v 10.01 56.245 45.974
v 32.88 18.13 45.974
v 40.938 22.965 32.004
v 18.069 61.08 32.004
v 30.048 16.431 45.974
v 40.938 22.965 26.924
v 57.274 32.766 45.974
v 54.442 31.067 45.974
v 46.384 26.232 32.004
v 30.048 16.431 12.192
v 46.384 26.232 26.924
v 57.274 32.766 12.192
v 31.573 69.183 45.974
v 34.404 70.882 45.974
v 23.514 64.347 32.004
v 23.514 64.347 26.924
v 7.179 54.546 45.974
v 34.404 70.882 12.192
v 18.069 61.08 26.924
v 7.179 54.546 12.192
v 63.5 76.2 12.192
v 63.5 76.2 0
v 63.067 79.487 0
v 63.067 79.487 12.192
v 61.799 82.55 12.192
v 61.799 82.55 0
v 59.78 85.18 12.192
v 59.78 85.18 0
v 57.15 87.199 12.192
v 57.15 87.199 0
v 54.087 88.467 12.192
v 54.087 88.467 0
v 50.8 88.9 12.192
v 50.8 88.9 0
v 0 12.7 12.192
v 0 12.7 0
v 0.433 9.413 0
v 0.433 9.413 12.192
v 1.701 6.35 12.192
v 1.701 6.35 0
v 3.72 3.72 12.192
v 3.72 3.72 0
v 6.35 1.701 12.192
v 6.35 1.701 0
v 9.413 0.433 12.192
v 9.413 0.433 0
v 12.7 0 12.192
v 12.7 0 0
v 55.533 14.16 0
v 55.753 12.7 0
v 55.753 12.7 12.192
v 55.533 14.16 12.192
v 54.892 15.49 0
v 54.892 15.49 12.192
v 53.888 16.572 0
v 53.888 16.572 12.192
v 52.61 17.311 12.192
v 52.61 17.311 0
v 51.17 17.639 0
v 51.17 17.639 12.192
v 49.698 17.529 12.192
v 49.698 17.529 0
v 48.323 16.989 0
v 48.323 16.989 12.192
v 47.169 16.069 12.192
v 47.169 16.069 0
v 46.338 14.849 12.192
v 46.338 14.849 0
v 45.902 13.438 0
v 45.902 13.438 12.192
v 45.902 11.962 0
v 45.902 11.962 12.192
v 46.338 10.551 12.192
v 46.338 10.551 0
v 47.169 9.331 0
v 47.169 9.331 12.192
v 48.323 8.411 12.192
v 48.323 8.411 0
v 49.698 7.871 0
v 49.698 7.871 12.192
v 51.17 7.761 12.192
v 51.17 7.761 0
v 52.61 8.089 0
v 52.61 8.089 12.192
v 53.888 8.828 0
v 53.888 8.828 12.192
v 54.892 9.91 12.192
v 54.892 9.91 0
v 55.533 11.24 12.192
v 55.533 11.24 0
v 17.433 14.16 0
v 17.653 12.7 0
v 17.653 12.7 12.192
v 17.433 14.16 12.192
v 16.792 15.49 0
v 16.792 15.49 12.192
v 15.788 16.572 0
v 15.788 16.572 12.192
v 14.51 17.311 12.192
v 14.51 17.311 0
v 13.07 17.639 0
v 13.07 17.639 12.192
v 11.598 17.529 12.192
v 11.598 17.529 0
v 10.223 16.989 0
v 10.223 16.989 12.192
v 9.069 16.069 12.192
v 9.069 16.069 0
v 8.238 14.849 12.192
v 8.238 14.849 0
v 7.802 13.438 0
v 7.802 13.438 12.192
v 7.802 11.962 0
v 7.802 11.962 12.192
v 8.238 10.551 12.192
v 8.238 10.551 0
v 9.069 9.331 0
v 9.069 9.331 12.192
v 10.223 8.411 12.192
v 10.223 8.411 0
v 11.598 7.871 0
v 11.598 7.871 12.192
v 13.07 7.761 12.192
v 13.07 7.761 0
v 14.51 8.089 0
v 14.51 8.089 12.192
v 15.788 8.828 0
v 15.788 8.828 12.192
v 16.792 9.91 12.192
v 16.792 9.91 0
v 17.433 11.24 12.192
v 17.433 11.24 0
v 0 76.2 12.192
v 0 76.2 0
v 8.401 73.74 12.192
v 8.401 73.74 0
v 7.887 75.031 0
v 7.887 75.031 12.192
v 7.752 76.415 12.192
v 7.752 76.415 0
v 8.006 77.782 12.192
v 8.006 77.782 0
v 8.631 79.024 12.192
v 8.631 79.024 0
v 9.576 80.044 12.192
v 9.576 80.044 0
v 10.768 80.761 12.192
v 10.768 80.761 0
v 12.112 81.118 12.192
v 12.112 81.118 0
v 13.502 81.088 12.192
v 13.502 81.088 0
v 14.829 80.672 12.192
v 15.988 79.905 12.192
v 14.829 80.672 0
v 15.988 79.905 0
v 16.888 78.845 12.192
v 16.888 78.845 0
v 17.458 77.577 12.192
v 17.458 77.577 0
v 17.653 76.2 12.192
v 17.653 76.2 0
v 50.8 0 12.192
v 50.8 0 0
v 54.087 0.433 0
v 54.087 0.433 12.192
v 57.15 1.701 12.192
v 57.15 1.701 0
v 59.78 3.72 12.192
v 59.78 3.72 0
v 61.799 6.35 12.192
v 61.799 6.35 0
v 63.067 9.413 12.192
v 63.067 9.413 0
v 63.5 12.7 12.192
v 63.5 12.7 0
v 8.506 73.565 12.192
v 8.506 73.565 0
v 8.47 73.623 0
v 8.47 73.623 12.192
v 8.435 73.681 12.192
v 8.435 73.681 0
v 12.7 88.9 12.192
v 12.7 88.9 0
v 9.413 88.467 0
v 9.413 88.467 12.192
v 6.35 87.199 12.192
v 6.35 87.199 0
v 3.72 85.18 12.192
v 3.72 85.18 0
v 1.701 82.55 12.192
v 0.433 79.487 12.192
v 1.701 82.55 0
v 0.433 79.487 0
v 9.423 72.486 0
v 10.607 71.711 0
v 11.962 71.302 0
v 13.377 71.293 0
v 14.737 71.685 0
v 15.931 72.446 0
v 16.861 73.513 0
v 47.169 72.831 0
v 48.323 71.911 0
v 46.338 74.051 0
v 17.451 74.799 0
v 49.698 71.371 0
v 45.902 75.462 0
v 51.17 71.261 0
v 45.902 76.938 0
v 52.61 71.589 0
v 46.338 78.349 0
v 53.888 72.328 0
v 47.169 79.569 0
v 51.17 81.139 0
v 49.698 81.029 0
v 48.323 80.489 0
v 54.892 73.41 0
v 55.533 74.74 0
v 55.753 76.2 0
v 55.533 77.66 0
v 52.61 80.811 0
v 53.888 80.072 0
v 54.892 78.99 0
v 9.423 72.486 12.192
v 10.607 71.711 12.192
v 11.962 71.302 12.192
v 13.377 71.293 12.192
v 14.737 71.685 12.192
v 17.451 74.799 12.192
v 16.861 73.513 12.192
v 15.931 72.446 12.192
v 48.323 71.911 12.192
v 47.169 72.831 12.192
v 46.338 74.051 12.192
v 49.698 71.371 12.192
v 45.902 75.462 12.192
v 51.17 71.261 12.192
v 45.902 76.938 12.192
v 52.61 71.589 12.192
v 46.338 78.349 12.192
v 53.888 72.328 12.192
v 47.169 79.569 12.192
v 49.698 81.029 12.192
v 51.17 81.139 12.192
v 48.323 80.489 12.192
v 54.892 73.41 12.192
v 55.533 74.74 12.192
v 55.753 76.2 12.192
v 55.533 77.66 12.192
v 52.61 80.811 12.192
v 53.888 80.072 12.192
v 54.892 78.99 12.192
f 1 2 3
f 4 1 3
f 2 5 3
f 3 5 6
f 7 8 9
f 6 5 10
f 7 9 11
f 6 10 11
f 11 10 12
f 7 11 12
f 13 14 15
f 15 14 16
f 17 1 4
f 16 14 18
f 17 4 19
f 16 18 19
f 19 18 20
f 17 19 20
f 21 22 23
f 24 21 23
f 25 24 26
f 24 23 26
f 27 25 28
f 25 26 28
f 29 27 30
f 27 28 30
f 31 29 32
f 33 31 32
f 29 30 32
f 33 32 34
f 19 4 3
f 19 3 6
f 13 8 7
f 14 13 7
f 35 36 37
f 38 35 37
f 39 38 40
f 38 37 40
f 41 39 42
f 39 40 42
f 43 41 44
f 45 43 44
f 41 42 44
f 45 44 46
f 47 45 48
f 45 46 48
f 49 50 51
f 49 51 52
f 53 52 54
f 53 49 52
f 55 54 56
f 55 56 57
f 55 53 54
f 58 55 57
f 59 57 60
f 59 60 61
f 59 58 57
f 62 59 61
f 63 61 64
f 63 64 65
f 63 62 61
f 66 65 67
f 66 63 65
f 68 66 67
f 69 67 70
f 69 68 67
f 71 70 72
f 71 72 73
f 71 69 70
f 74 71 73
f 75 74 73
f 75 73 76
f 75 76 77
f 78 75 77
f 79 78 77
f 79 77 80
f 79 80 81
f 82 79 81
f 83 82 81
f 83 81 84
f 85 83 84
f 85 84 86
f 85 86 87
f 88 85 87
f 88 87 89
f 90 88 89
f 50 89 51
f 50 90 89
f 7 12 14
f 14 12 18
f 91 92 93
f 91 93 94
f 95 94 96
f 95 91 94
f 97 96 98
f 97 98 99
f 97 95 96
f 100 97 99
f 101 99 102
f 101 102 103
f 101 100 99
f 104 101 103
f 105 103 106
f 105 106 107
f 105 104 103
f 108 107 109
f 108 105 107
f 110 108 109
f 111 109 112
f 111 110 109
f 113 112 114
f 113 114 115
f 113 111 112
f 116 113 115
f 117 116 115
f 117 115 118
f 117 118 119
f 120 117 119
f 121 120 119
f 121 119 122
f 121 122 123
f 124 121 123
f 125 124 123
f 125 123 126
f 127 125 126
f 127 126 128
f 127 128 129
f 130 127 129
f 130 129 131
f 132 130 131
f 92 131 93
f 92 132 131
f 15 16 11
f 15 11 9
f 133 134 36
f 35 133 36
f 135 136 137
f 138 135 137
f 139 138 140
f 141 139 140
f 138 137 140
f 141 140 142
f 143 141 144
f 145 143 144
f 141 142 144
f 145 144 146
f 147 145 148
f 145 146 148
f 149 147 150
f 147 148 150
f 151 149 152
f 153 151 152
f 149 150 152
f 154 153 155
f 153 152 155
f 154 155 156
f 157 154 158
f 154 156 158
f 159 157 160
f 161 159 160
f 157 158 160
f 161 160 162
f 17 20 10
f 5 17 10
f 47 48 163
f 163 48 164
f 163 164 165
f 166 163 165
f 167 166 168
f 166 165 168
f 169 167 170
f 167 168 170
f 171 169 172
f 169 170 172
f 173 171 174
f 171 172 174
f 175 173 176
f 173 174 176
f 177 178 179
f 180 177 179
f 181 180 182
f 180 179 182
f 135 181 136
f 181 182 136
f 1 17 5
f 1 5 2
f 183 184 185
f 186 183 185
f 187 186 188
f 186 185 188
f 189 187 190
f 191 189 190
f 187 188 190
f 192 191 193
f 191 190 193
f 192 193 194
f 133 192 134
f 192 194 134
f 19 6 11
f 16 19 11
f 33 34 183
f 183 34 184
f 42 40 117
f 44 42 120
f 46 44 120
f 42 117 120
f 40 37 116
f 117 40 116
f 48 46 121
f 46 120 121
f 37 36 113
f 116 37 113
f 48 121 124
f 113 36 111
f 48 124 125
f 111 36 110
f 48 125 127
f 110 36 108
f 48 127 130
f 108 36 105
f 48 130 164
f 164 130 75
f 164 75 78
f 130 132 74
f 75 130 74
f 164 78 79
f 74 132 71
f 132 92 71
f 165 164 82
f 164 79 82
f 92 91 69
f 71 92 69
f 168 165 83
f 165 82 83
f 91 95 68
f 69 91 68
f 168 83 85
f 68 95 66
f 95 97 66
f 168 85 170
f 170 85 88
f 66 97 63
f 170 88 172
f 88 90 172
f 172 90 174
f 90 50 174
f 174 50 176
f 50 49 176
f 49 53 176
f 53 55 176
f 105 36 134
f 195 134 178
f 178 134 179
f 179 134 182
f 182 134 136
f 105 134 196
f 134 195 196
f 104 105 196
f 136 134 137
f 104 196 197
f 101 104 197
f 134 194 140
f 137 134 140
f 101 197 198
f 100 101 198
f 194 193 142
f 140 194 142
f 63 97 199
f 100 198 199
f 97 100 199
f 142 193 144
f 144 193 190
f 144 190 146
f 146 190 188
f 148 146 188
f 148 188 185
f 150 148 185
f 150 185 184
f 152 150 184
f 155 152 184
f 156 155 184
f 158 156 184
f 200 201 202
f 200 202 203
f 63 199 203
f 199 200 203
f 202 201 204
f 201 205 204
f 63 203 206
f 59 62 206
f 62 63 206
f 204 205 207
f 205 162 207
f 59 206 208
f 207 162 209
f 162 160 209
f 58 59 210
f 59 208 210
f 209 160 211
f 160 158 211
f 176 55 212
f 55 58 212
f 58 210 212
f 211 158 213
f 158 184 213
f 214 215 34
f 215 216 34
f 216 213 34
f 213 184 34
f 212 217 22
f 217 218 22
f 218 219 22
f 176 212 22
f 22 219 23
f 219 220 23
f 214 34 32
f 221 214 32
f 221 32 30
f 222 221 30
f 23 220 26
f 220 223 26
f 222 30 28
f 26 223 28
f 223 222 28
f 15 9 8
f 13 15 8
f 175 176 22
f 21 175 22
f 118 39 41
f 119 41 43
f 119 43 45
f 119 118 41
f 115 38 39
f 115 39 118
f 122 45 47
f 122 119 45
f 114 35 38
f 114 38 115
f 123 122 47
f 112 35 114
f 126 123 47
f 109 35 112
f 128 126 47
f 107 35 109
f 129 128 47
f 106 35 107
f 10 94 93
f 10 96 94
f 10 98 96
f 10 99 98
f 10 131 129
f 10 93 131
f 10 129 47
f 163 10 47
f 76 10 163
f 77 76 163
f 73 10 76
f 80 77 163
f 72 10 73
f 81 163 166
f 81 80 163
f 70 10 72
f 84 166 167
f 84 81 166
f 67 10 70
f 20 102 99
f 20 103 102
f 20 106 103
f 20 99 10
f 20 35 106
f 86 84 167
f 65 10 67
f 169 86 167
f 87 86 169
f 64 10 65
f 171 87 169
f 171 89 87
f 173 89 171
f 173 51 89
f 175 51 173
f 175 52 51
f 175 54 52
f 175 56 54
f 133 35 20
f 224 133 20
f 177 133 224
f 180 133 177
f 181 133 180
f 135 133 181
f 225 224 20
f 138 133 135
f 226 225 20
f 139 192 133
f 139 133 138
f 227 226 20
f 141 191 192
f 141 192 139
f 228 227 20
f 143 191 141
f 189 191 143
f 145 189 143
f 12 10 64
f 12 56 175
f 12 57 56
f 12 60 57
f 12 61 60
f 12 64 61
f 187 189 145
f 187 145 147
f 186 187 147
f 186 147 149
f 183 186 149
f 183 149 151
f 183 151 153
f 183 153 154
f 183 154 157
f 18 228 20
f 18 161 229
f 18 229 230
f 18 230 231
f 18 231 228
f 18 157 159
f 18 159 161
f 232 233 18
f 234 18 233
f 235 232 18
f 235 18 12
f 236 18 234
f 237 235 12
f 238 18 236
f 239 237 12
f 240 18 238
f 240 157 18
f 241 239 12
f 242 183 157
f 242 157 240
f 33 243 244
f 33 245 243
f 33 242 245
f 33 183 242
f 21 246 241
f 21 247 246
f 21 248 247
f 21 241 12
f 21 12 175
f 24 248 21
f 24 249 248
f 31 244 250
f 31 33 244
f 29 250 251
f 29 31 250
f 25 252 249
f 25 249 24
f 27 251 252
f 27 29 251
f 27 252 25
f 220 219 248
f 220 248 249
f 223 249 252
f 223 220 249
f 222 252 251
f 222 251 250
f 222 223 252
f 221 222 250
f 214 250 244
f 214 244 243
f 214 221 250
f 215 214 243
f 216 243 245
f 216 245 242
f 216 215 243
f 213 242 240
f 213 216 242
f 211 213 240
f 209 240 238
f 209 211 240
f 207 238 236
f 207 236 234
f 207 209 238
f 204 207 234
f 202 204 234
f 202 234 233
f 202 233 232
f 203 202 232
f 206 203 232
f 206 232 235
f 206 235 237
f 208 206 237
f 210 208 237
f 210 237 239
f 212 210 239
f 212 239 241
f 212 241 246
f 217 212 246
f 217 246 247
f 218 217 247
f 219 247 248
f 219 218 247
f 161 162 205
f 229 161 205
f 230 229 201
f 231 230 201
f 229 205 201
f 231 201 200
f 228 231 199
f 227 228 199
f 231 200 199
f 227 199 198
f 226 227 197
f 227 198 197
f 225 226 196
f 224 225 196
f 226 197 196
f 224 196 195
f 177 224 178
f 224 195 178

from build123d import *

# Parameters (mm, degrees)
F0_R     = 4.953
F1_DEPTH = 12.192
F2_DEPTH = 45.974
F4_DEPTH = 77.6025691706


with BuildPart() as f1:
    # F0 (on Top) → F1 (new body)
    with BuildSketch(Plane.XY):
        with BuildLine():
            ThreePointArc((0, 12.7), (3.7197438789, 3.7197438789), (12.7, 0))
            Line((12.7, 0), (50.8, 0))
            ThreePointArc((50.8, 0), (59.7802561211, 3.7197438789), (63.5, 12.7))
            Line((63.5, 12.7), (63.5, 76.2))
            ThreePointArc((63.5, 76.2), (59.7802561211, 85.1802561211), (50.8, 88.9))
            Line((50.8, 88.9), (12.7, 88.9))
            ThreePointArc((12.7, 88.9), (3.7197438789, 85.1802561211), (0, 76.2))
            Line((0, 76.2), (0, 12.7))
        make_face()
        with Locations((12.7, 12.7)):
            Circle(F0_R, mode=Mode.SUBTRACT)
        with Locations((50.8, 12.7)):
            Circle(F0_R, mode=Mode.SUBTRACT)
        Polygon((34.4043359374, 70.8815605479), (57.2736722661, 32.766), (30.0482718748, 16.4307597652), (7.178935546, 54.5463203131), align=None, mode=Mode.SUBTRACT)
        with BuildLine():
            ThreePointArc((8.5061583053, 73.5648717603), (8.452801422, 73.6517627193), (8.4012445439, 73.7397336468))
            ThreePointArc((8.4012445439, 73.7397336468), (11.4271148469, 80.9866452121), (17.653, 76.2))
            ThreePointArc((17.653, 76.2), (14.0711511744, 71.4405721503), (8.5061583053, 73.5648717603))
        make_face(mode=Mode.SUBTRACT)
        with Locations((50.8, 76.2)):
            Circle(F0_R, mode=Mode.SUBTRACT)
    extrude(amount=F1_DEPTH)

    # F0 (on Top) → F2 (join)
    with BuildSketch(Plane.XY):
        Polygon((30.0482718748, 16.4307597652), (57.2736722661, 32.766), (34.4043359374, 70.8815605479), (7.178935546, 54.5463203131), align=None)
    extrude(amount=F2_DEPTH)

    # F3 (on face) → F4 (cut, through all)
    with BuildSketch(Plane(origin=(0.7050897175, -1.1751495292, 0), x_dir=(0.8574929257, 0.5144957554, 0), z_dir=(0.5144957554, -0.8574929257, 0))):
        Polygon((62.6677367201, 45.974), (37.5217367201, 45.974), (46.9197367201, 32.004), (46.9197367201, 26.924), (53.2697367201, 26.924), (53.2697367201, 32.004), align=None)
    extrude(amount=-F4_DEPTH, mode=Mode.SUBTRACT)


solid = f1.part
